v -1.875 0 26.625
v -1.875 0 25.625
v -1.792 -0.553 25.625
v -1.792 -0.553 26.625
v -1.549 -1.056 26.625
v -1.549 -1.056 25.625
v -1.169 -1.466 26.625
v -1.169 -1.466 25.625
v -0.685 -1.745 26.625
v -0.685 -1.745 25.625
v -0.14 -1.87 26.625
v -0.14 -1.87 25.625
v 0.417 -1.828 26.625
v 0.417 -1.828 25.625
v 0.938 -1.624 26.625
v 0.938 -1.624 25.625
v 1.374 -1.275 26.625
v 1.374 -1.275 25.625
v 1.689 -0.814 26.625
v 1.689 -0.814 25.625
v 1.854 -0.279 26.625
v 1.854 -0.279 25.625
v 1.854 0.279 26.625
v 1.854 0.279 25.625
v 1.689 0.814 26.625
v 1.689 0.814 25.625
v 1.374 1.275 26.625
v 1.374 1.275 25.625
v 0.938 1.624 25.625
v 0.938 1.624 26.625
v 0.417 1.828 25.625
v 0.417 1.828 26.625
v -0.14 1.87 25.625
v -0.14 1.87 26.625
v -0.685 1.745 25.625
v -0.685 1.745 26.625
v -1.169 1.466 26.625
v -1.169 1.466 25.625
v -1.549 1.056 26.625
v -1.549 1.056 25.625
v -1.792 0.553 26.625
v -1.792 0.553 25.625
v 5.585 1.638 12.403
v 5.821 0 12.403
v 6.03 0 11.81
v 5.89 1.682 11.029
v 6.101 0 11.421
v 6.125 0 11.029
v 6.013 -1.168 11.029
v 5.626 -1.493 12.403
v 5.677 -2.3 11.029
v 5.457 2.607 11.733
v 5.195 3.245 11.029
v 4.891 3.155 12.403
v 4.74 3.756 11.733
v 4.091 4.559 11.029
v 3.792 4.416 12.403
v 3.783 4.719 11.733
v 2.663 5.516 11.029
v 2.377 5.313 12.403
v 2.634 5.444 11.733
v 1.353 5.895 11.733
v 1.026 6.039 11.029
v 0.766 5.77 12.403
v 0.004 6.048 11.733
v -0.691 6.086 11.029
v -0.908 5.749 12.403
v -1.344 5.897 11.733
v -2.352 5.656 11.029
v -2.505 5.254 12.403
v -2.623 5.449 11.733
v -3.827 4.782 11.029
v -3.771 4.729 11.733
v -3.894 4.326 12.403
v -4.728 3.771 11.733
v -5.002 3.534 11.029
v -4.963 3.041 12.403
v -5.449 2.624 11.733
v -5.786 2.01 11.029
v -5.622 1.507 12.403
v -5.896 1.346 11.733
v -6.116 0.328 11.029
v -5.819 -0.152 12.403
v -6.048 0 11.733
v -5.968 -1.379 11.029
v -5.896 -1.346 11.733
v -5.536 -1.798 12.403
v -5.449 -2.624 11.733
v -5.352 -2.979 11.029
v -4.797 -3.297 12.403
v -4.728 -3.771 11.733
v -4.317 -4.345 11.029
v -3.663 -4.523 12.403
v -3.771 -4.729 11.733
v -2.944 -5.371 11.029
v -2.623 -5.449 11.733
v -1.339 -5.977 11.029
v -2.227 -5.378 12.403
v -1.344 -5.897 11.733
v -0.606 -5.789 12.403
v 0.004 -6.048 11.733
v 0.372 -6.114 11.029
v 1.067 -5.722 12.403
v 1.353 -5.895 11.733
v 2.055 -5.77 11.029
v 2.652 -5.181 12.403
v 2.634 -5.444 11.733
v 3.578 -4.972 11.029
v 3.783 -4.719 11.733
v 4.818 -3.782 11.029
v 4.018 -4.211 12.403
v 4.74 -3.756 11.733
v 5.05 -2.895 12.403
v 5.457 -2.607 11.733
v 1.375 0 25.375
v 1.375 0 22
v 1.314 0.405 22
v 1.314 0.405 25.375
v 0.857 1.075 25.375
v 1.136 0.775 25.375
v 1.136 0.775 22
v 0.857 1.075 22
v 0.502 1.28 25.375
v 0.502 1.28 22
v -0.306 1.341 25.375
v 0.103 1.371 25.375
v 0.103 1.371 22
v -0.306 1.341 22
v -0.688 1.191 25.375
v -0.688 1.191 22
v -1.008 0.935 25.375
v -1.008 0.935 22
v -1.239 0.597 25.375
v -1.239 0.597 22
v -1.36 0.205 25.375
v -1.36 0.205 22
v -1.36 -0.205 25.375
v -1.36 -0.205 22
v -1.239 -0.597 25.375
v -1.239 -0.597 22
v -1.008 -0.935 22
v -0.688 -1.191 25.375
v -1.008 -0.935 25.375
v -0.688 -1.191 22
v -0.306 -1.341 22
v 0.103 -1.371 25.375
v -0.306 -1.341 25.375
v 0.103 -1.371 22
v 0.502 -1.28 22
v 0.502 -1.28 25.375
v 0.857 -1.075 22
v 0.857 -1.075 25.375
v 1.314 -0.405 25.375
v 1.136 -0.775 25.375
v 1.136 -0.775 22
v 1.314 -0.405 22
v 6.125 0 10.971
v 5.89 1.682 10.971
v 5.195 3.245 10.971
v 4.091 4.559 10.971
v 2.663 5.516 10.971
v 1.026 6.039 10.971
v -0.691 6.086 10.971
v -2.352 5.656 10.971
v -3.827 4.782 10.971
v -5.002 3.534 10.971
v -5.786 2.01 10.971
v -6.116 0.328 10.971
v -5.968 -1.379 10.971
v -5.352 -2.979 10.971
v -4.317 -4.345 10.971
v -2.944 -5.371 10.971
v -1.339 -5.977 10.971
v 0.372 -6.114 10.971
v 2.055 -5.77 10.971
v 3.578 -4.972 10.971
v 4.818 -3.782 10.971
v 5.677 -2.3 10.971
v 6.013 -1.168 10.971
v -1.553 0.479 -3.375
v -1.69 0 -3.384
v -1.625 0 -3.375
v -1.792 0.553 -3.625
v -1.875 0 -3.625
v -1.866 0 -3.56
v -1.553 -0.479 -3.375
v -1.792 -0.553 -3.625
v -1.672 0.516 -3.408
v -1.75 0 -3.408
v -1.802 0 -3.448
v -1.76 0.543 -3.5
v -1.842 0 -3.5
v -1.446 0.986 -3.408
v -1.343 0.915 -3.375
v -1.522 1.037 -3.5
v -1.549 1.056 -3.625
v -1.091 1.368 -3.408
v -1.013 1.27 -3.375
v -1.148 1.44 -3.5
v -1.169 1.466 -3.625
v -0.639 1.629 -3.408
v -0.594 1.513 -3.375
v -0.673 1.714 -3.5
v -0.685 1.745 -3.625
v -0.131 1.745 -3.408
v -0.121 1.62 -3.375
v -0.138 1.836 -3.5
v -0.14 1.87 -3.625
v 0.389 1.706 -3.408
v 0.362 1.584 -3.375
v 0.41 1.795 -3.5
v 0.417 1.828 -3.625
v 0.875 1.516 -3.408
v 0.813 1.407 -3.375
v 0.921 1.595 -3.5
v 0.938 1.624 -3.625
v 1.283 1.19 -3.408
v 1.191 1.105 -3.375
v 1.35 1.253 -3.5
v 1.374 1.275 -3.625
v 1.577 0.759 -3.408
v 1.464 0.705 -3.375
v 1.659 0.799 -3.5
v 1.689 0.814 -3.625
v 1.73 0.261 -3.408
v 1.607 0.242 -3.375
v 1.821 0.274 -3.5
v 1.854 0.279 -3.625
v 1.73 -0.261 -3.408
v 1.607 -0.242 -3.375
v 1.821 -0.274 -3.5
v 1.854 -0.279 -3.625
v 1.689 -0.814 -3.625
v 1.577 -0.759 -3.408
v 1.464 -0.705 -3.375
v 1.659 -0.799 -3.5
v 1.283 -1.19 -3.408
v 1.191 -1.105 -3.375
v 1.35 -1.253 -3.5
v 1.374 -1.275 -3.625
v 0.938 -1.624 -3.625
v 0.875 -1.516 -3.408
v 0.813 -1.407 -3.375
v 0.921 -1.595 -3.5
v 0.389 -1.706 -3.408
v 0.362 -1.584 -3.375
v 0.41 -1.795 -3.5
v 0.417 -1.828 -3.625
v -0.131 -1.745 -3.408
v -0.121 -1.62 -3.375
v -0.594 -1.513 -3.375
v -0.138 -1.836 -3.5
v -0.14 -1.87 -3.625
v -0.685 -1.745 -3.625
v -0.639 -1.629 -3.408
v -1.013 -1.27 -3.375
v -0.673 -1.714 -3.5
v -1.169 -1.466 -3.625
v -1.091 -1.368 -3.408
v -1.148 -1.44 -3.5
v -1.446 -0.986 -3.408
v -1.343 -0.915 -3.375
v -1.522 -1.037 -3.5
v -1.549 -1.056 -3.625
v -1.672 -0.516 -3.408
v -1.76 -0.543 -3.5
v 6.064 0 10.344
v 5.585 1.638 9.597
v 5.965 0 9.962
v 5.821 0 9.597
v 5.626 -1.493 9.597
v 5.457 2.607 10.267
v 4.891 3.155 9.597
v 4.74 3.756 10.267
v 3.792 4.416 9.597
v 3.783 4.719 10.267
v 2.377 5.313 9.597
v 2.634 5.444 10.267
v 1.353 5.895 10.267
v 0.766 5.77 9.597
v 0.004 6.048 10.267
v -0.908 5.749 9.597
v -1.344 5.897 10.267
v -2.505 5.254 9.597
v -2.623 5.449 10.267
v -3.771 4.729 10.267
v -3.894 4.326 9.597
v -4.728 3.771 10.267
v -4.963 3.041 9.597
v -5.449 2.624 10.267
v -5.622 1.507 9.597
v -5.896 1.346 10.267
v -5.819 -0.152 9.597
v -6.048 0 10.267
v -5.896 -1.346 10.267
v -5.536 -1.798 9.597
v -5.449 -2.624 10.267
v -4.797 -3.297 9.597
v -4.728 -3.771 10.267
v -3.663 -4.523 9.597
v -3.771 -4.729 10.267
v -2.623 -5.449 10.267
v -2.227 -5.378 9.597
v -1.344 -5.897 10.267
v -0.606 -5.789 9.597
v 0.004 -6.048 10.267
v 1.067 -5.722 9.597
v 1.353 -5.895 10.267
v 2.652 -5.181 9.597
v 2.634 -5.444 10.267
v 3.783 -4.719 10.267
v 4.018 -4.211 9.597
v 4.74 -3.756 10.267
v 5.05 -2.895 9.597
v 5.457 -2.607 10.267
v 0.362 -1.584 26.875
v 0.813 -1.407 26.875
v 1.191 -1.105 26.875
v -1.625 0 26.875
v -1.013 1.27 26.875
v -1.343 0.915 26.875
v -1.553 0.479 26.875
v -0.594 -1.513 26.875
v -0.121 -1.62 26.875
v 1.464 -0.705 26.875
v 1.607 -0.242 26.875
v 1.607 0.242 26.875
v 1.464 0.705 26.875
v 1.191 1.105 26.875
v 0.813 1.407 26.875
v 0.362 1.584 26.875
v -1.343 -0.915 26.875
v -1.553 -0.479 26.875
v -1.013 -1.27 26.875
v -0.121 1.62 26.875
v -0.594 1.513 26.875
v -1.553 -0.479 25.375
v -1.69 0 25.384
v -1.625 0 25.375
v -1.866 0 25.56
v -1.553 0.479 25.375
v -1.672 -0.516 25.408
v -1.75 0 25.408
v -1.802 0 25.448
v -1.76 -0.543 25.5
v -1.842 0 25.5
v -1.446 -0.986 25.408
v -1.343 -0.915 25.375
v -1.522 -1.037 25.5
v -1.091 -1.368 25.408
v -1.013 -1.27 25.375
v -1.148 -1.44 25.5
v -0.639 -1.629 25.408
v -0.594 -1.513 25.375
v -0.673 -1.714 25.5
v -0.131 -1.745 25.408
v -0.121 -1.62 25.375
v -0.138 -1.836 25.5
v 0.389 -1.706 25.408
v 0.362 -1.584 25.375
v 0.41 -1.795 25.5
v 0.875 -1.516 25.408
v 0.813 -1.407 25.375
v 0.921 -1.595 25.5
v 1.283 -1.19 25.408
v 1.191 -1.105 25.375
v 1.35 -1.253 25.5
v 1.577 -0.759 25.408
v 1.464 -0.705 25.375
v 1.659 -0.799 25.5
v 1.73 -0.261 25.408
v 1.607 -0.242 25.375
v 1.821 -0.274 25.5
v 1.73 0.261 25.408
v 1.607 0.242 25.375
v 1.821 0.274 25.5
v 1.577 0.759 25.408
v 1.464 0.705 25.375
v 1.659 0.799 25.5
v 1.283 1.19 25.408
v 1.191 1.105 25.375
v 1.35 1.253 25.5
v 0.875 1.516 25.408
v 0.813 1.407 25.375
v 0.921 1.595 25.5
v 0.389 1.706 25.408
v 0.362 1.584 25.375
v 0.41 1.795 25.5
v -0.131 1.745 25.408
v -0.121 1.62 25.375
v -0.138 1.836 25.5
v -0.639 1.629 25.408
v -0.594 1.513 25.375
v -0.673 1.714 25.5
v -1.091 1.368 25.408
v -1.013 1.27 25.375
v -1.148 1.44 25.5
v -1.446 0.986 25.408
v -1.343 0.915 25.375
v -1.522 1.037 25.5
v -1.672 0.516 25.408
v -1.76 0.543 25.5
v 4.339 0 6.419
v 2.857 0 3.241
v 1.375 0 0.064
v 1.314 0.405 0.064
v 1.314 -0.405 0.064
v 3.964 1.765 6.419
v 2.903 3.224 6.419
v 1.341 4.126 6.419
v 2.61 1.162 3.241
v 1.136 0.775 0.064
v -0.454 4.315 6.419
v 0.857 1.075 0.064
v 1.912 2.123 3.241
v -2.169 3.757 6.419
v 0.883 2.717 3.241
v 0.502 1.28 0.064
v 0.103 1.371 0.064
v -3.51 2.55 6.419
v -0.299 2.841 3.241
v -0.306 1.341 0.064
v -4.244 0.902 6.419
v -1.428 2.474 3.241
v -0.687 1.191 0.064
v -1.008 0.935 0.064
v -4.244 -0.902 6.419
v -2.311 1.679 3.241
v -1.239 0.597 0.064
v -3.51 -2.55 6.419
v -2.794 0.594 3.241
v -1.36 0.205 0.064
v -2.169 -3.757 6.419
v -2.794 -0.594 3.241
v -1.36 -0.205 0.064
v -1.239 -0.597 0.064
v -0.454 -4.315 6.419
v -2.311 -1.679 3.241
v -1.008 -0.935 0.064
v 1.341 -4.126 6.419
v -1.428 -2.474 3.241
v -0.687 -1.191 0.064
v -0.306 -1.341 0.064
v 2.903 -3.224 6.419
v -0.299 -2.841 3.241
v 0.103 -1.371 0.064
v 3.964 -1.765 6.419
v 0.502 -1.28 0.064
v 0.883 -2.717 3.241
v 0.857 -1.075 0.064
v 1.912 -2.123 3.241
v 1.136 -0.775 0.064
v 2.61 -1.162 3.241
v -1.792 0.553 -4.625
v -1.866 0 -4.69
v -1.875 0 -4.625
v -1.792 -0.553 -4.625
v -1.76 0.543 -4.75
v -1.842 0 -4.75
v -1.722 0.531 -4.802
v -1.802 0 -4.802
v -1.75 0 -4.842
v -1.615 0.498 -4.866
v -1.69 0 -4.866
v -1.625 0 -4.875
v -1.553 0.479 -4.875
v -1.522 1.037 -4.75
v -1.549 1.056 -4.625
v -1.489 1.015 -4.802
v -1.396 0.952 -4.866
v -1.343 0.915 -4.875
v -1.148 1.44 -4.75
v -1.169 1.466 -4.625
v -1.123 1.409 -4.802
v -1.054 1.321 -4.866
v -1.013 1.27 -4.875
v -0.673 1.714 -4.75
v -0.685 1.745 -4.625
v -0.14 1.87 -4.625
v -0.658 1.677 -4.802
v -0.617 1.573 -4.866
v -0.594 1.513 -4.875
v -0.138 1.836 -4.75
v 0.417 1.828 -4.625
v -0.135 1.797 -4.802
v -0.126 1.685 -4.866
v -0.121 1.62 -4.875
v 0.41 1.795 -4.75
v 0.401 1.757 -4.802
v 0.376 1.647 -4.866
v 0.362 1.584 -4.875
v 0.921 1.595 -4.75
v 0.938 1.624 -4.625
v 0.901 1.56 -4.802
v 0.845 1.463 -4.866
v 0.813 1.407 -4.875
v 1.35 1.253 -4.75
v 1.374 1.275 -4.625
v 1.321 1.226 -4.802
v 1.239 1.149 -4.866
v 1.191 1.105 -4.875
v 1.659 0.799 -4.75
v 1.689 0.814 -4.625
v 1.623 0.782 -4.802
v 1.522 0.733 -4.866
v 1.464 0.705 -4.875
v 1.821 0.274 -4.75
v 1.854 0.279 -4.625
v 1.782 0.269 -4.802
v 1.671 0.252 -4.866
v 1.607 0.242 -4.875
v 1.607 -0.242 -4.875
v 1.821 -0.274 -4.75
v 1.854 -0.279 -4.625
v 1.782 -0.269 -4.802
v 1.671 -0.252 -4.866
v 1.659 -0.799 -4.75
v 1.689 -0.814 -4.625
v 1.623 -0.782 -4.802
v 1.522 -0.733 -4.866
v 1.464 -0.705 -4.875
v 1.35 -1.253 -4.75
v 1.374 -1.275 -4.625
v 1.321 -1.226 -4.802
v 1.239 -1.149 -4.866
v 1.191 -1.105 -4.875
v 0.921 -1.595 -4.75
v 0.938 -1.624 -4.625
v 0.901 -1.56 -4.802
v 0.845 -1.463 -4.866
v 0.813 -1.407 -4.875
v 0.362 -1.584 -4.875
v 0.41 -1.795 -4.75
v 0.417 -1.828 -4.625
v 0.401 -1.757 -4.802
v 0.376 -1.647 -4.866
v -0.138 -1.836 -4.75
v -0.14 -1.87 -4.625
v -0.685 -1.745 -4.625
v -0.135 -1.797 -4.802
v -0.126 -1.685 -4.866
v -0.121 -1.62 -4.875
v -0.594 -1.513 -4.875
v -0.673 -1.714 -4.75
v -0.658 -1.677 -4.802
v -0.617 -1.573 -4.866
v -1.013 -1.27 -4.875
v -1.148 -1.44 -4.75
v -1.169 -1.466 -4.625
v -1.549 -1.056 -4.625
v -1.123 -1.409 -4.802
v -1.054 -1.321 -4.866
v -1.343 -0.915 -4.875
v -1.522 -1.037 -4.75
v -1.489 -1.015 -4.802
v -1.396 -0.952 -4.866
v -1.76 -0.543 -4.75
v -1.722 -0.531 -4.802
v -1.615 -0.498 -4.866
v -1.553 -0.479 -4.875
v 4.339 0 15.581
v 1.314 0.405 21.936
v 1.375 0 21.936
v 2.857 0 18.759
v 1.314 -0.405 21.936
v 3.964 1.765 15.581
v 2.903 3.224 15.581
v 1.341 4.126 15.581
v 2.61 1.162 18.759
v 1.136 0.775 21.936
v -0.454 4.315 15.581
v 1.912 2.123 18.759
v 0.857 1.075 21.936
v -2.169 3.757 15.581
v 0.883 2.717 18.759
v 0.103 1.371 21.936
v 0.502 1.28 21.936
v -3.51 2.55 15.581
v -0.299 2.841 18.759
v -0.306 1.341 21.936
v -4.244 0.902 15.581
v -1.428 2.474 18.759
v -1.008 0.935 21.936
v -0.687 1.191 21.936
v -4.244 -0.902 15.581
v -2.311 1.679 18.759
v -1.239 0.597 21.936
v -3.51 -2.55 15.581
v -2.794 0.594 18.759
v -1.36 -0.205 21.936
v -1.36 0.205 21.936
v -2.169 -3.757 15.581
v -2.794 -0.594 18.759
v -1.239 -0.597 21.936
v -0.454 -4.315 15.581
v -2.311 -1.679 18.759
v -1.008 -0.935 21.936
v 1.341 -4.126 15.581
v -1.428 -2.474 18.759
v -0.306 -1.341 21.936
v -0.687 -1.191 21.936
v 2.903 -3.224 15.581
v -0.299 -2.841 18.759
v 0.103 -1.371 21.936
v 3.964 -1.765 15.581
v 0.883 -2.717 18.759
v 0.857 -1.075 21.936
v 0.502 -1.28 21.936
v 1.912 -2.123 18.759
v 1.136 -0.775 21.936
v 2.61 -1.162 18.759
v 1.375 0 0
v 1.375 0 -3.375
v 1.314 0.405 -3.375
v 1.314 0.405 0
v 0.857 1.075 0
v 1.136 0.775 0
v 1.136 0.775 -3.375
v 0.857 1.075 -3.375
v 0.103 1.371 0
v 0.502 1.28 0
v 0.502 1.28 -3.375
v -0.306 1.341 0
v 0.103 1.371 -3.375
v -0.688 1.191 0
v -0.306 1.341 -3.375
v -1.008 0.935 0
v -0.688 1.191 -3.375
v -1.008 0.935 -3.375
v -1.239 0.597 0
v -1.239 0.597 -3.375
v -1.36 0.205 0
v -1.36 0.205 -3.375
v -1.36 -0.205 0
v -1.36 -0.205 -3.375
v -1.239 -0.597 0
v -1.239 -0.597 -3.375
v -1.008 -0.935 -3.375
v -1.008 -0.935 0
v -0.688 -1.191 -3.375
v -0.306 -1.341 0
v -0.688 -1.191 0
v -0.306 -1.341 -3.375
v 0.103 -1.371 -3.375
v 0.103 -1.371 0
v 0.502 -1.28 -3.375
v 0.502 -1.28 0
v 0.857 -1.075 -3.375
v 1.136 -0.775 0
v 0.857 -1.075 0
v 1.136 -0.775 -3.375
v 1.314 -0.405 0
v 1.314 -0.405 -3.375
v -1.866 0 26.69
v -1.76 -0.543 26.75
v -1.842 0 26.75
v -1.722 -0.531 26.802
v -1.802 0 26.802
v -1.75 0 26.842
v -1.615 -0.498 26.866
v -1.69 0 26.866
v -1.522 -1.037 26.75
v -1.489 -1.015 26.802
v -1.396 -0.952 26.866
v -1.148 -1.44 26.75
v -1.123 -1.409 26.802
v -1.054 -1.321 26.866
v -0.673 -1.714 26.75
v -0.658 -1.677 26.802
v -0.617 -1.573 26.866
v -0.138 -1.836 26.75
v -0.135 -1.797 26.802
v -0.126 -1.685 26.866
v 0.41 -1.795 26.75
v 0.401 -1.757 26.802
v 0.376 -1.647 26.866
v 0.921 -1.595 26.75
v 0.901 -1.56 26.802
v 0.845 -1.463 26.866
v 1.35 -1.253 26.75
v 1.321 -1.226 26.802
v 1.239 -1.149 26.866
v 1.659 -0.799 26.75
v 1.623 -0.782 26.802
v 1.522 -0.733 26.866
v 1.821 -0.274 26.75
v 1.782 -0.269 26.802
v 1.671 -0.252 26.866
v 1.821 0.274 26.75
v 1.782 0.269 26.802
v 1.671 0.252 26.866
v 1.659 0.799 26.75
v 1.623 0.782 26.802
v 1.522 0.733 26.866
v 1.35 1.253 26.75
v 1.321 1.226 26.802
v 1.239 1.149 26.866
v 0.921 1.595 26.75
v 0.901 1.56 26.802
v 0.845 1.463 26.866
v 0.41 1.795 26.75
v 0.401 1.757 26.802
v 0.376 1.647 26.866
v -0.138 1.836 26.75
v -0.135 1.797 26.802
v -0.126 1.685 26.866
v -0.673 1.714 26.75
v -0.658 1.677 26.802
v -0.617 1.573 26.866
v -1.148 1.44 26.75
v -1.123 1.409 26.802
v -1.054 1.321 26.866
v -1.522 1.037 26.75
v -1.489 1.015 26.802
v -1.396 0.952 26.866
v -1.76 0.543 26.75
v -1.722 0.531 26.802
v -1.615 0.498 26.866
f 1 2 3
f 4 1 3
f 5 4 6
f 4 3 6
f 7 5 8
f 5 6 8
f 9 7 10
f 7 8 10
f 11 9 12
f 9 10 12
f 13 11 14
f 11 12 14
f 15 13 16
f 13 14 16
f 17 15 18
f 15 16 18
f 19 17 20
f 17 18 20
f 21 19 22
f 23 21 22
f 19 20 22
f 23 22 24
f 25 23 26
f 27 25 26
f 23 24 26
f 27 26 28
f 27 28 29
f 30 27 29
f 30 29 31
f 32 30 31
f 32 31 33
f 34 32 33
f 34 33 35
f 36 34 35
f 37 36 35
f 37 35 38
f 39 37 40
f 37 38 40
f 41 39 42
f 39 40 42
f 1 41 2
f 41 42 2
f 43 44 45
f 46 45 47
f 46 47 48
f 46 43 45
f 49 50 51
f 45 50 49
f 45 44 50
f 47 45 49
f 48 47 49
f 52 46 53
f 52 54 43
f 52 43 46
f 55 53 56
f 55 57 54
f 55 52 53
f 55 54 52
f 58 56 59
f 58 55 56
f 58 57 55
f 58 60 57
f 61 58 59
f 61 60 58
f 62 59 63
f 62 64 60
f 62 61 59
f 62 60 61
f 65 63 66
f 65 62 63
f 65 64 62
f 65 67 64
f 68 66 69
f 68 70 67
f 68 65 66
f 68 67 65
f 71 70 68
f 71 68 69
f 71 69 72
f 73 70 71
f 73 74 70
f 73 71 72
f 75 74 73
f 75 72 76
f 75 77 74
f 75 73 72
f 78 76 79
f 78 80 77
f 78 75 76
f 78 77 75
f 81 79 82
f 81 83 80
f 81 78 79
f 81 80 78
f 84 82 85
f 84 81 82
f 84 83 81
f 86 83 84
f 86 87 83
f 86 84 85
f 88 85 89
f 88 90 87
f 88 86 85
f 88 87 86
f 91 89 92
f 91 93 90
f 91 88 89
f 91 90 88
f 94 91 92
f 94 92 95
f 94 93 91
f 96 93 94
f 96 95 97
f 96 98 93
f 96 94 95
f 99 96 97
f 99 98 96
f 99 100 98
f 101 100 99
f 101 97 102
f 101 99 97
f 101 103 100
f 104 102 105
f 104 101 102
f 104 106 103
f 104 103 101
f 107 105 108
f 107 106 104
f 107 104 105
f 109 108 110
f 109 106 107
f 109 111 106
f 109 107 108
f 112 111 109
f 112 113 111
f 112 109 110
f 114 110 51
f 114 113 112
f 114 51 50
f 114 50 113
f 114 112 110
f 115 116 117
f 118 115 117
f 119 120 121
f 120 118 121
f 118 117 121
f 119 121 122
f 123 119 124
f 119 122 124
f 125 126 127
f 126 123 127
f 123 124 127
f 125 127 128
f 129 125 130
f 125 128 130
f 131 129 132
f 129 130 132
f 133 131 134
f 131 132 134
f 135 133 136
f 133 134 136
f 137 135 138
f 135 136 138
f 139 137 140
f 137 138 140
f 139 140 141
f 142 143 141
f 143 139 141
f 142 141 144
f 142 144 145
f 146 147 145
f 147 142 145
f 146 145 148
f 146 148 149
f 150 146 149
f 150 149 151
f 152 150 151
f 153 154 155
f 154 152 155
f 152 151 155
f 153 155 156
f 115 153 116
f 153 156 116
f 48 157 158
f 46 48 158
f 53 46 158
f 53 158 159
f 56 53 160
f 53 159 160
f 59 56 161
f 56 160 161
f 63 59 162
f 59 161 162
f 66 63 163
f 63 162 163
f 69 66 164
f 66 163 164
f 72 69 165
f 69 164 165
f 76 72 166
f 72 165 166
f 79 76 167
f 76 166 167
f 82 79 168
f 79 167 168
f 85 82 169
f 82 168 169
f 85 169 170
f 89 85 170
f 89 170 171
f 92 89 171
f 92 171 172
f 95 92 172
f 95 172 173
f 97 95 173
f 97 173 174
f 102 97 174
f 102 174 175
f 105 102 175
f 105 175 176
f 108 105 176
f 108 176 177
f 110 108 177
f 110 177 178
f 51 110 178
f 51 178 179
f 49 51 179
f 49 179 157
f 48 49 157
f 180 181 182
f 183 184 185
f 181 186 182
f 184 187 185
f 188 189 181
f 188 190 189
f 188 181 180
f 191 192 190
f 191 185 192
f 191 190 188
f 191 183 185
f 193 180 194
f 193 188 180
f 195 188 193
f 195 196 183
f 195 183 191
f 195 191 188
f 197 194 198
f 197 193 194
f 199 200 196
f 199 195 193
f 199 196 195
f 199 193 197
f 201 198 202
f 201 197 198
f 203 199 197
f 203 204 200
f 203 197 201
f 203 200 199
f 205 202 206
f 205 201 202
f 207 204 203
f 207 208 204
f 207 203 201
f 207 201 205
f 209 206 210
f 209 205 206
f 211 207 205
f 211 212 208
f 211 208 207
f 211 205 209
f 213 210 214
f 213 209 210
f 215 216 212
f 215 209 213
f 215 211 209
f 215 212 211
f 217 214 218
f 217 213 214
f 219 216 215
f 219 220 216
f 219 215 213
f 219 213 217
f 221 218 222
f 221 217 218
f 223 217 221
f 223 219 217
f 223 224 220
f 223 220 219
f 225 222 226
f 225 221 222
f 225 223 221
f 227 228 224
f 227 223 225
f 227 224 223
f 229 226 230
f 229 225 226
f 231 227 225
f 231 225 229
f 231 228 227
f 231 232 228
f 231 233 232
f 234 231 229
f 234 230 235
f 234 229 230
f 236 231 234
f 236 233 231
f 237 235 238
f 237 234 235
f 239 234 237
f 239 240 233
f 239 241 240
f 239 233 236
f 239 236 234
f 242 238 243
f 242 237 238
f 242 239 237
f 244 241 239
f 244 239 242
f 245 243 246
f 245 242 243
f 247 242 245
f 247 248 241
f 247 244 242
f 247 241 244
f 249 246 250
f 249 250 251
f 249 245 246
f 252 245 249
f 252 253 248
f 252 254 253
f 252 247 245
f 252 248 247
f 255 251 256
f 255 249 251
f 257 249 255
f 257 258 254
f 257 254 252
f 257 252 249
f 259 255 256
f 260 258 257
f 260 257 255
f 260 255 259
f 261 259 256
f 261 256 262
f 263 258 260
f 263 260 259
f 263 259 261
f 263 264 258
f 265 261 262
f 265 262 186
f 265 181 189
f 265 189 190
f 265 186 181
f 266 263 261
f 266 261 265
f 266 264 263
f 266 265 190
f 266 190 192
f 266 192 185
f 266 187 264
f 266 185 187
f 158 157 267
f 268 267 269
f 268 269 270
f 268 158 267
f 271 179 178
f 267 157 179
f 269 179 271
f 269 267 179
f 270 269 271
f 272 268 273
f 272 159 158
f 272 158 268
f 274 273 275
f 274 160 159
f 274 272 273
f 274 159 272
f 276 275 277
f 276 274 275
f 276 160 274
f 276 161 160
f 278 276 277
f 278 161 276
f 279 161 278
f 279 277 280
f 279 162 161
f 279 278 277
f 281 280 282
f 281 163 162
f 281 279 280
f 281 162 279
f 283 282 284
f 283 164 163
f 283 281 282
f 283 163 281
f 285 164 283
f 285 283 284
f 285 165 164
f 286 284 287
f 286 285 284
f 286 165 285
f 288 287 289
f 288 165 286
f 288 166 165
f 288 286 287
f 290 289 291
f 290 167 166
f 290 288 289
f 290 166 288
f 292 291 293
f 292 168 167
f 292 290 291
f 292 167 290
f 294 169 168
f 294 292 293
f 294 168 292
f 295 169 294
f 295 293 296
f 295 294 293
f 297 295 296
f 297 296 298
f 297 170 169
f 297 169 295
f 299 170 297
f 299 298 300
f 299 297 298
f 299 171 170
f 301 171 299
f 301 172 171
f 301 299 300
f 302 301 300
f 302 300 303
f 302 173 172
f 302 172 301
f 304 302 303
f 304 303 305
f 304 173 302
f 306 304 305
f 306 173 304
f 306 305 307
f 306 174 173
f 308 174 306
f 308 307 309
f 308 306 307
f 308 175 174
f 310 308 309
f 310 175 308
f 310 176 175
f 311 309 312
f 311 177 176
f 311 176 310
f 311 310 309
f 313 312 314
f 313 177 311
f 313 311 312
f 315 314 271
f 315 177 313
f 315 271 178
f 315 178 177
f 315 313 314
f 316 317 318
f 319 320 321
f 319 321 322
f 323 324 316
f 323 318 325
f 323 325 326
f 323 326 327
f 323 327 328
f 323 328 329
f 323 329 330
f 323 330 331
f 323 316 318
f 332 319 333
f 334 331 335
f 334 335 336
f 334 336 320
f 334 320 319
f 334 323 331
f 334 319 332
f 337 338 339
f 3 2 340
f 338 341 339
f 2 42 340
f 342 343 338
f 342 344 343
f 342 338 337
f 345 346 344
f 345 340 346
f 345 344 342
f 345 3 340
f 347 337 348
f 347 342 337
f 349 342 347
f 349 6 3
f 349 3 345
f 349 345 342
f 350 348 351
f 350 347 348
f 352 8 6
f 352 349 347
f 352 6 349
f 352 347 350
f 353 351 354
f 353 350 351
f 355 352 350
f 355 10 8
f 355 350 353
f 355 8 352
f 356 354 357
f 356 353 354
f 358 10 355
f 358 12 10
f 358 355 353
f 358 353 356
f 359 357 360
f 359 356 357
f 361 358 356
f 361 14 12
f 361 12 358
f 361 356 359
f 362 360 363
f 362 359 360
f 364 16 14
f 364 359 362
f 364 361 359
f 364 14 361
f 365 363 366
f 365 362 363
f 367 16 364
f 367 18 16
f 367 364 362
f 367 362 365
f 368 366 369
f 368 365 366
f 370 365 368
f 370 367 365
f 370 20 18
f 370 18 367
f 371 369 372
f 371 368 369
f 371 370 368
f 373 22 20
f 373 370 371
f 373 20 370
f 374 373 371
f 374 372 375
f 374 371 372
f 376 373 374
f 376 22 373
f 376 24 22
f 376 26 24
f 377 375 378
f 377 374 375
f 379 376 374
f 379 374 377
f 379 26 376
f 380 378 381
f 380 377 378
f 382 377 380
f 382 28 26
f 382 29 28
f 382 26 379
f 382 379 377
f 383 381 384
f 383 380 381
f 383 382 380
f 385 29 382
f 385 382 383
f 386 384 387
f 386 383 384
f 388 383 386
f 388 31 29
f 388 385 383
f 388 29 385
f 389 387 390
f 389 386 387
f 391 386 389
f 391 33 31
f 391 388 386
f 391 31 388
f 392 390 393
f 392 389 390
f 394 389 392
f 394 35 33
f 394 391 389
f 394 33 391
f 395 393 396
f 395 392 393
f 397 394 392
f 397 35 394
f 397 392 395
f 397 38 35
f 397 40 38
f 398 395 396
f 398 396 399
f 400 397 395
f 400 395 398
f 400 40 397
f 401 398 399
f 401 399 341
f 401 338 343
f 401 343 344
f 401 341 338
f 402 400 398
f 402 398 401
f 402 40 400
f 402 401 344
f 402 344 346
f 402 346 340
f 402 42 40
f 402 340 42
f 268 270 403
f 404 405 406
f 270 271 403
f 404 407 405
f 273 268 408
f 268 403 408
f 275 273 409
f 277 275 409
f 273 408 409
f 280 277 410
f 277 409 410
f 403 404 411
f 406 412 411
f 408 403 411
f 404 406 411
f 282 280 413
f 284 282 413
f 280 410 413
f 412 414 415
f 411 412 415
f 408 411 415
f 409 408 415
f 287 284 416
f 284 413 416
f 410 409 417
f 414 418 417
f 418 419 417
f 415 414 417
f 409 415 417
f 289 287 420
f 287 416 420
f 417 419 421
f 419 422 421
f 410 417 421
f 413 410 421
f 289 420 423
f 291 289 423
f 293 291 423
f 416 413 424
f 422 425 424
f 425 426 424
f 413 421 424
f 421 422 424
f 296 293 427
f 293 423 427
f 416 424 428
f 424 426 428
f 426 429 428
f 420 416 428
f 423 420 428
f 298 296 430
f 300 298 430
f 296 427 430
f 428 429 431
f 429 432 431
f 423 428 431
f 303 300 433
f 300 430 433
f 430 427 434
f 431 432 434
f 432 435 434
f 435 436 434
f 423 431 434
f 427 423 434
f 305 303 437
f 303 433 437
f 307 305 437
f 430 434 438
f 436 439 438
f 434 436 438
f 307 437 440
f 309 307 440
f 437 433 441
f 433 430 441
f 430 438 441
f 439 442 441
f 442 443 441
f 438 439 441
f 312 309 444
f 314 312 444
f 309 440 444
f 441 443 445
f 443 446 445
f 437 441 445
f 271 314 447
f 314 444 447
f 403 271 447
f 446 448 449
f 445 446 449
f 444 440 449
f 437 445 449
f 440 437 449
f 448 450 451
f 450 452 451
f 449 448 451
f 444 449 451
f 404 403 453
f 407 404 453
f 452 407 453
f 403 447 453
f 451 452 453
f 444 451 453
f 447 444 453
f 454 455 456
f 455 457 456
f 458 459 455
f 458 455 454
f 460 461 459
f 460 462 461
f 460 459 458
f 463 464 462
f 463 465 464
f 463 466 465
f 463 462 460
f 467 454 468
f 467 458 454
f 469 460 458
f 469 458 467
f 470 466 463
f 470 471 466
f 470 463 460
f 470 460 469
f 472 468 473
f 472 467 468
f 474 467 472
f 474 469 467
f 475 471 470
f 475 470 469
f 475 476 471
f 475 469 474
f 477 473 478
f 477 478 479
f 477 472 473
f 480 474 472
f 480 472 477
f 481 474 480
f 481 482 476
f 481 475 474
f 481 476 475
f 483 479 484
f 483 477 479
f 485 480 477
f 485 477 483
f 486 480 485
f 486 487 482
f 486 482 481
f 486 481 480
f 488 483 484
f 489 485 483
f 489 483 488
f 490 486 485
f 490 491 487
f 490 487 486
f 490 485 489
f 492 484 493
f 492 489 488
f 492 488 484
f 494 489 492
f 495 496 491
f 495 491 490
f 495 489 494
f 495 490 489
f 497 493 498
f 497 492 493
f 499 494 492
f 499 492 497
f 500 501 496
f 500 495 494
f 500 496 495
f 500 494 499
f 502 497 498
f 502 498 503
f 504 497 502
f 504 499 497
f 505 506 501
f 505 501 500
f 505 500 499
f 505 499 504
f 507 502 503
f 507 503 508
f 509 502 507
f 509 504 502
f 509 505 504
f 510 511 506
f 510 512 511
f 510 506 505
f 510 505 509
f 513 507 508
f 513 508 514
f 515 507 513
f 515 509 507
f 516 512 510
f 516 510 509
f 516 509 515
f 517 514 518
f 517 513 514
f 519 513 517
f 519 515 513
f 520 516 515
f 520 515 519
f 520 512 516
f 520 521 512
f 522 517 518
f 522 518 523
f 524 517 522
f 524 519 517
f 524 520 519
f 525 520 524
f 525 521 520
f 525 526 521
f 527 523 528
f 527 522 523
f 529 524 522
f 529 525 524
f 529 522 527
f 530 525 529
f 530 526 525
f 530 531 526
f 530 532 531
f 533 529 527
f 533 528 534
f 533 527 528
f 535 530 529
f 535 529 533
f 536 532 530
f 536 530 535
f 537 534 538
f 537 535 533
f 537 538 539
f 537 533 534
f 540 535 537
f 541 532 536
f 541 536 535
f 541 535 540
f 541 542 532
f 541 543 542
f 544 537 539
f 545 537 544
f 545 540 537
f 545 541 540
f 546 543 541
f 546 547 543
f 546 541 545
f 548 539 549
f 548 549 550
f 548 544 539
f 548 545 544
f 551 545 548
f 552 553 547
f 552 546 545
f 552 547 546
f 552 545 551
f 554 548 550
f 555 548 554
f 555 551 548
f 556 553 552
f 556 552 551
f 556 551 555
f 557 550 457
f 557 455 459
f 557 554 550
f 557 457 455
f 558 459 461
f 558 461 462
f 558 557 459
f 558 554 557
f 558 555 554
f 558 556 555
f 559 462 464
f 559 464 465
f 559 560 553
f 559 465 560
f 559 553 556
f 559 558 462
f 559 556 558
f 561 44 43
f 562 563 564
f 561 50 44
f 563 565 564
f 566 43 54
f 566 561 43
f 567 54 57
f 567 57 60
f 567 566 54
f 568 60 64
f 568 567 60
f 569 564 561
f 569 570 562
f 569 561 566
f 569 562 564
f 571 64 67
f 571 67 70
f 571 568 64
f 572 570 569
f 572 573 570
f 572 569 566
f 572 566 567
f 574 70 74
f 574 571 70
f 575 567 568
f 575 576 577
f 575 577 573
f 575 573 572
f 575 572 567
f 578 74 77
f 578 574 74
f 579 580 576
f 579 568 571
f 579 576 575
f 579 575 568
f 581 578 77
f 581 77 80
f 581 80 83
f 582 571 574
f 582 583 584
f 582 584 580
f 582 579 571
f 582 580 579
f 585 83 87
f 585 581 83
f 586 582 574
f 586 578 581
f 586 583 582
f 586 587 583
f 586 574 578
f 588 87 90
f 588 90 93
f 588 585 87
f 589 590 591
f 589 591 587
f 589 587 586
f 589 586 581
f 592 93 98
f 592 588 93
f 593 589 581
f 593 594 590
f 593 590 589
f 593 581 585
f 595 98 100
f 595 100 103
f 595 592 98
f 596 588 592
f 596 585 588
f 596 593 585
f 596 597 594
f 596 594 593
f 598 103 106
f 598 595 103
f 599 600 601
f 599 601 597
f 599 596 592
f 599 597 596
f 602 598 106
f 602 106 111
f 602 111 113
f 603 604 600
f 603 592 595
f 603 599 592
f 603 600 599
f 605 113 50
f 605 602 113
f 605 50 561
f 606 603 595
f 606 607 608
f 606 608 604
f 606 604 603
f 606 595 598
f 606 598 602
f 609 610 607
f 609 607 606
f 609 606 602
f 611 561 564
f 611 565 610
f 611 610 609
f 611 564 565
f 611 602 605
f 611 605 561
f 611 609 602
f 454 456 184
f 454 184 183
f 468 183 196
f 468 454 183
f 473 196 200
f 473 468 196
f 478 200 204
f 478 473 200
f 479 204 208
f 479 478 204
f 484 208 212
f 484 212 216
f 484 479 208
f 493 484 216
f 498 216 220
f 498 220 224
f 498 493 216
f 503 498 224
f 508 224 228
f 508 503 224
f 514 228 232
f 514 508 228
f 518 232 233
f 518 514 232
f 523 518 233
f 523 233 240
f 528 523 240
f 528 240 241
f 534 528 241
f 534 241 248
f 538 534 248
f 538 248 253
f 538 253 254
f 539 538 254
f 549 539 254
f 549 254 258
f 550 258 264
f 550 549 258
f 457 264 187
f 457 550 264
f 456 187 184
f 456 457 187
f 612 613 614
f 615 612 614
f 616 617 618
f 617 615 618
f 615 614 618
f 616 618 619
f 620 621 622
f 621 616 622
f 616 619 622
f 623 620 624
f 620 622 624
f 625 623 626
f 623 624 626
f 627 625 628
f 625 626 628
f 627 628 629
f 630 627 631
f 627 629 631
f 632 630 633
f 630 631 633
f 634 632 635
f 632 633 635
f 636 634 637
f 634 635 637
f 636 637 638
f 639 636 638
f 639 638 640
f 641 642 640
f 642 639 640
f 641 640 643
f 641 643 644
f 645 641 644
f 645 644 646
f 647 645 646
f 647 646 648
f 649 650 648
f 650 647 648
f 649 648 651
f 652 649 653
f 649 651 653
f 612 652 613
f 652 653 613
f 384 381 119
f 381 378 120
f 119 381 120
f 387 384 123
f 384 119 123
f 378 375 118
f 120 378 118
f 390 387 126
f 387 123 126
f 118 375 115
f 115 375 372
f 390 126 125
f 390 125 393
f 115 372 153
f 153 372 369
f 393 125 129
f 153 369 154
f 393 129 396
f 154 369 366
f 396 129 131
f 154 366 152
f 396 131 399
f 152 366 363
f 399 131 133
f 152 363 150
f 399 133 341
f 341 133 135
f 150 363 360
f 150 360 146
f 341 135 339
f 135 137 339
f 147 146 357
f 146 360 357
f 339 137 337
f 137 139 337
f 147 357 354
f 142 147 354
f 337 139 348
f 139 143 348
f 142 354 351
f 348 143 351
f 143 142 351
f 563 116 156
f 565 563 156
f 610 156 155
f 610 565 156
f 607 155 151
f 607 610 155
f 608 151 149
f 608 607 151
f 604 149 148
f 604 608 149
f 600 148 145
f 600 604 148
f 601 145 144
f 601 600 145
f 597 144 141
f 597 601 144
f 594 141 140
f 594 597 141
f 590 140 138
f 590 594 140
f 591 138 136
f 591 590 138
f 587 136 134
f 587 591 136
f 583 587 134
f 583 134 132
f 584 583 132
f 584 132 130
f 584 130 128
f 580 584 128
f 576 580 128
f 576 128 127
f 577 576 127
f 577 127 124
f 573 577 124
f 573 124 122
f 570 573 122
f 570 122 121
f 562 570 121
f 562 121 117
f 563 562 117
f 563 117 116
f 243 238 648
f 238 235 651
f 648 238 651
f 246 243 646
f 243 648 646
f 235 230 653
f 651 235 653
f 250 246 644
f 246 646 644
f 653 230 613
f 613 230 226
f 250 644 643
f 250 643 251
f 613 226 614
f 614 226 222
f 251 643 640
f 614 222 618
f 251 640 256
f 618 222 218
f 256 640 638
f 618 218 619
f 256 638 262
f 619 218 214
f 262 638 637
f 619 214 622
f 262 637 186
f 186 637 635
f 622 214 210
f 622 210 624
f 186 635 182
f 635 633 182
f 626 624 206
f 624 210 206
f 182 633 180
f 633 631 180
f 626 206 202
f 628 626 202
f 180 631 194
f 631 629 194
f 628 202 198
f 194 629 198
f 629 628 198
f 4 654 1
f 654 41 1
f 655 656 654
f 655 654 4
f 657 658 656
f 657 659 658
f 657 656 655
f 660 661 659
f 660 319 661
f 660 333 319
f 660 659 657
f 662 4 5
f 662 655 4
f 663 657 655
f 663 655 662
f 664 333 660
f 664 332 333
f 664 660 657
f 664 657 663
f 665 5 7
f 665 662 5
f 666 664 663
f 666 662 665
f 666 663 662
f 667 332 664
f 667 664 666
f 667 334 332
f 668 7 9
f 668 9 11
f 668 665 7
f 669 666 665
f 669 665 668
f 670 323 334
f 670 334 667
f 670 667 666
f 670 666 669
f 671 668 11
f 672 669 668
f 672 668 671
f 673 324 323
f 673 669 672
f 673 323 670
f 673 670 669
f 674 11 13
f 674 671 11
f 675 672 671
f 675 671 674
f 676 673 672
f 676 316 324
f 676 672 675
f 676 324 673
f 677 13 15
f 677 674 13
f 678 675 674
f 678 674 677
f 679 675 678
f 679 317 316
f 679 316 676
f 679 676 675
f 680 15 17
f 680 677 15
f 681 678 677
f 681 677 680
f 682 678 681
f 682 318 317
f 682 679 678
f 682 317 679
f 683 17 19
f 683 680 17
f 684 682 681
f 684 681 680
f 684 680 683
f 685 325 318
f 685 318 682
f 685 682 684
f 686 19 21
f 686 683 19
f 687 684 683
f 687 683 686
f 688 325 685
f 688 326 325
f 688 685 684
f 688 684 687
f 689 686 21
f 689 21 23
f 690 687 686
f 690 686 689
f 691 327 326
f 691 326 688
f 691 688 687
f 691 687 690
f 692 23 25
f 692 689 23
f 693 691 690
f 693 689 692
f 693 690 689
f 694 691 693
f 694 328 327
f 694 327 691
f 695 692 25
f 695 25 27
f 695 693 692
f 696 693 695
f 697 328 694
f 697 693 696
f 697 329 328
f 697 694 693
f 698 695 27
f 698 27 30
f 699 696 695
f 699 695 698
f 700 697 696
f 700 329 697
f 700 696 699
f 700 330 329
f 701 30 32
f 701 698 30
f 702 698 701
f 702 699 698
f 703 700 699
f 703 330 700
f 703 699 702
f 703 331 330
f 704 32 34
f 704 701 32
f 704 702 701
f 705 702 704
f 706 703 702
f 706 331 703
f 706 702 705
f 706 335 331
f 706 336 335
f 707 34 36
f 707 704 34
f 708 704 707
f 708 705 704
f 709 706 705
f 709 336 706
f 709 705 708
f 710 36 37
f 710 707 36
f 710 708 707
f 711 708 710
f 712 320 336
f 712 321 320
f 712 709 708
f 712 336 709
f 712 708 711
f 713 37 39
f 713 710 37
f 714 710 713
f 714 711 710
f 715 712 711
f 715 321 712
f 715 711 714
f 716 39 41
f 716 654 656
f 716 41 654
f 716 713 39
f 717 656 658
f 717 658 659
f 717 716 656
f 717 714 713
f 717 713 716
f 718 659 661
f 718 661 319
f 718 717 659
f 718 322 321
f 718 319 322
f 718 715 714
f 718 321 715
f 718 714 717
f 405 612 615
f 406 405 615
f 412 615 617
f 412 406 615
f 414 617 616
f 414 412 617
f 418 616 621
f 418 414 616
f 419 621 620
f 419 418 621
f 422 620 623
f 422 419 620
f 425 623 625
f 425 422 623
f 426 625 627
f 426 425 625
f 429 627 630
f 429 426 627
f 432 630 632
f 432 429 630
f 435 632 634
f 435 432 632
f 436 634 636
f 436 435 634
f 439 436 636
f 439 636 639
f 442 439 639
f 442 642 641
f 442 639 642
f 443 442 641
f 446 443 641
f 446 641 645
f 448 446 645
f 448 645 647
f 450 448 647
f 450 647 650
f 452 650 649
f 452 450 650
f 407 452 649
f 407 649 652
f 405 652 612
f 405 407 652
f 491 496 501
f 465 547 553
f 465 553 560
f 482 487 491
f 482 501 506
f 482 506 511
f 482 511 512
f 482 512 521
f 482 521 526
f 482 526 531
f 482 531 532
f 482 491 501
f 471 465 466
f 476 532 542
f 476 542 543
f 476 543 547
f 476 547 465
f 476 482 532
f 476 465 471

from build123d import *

# Parameters (mm, degrees)
ESQUISSE1_R             = 6.125
BOSS_EXTRU_1_DEPTH      = 22
BOSS_EXTRU_2_DEPTH      = 15.875
BOSS_EXTRU_2_DEPTH_BACK = 15.875
BOSS_EXTRU_2_START      = -11
ESQUISSE2_R             = 1.375
ESQUISSE3_R             = 1.875
BOSS_EXTRU_3_DEPTH      = 1.5
BOSS_EXTRU_4_START      = -1.5
ESQUISSE4_R             = 1.875
BOSS_EXTRU_4_DEPTH      = 1.5
CHANFREIN1_SIZE         = 10.25
CHANFREIN1_SIZE_2       = 4.779653496
CONG_1_R                = 3.25
CONG_2_R                = 0.25


with BuildPart() as part:
    # Esquisse1 → Boss.-Extru.1 (new body)
    with BuildSketch(Plane.XY):
        Circle(ESQUISSE1_R)
    extrude(amount=BOSS_EXTRU_1_DEPTH)

    # Esquisse2 → Boss.-Extru.2 (add, two sides: drawn at the far end of the back side and taken through both)
    with BuildSketch(Plane.XY.offset(22).offset(BOSS_EXTRU_2_START - BOSS_EXTRU_2_DEPTH_BACK)):
        Circle(ESQUISSE2_R)
    extrude(amount=BOSS_EXTRU_2_DEPTH + BOSS_EXTRU_2_DEPTH_BACK)

    # Esquisse3 → Boss.-Extru.3 (add)
    with BuildSketch(Plane(origin=(0, 0, -4.875), x_dir=(-1, 0, 0), z_dir=(0, 0, -1))):
        Circle(ESQUISSE3_R)
    extrude(amount=-BOSS_EXTRU_3_DEPTH)

    # Esquisse4 → Boss.-Extru.4 (add)
    with BuildSketch(Plane.XY.offset(26.875).offset(BOSS_EXTRU_4_START)):
        with Locations(Location((0, 0, 0), (0, 0, 180))):
            Circle(ESQUISSE4_R)
    extrude(amount=BOSS_EXTRU_4_DEPTH)

    # Chanfrein1
    # the kernel refuses this chamfer: 10.25, 4.779653496 mm, written as the material it takes off along each edge
    with BuildSketch(Plane(origin=(0, 0, 22), x_dir=(1, 0, 0), z_dir=(0, -1, 0))) as chanfrein1_piece_1_section:
        Polygon((6.125, -CHANFREIN1_SIZE), (6.125 - CHANFREIN1_SIZE_2, 0), (6.125, 0), align=None)
    chanfrein1_piece_1 = revolve(axis=Axis((0, 0, 22), (0, 0, 1)), mode=Mode.PRIVATE)
    chanfrein1_piece_1 = chanfrein1_piece_1 - Plane(origin=(0, 0, 16.69695502), x_dir=(1, 0, 0), z_dir=(0, 0, -1)) * Cylinder(1.375, 41, mode=Mode.PRIVATE)
    add(chanfrein1_piece_1, mode=Mode.SUBTRACT)
    with BuildSketch(Plane(origin=(0, 0, 0), x_dir=(1, 0, 0), z_dir=(0, -1, 0))) as chanfrein1_piece_2_section:
        Polygon((6.125, CHANFREIN1_SIZE), (6.125 - CHANFREIN1_SIZE_2, 0), (6.125, 0), align=None)
    chanfrein1_piece_2 = revolve(axis=Axis((0, 0, 0), (0, 0, 1)), mode=Mode.PRIVATE)
    chanfrein1_piece_2 = chanfrein1_piece_2 - Plane(origin=(0, 0, 5.30304498), x_dir=(1, 0, 0), z_dir=(0, 0, 1)) * Cylinder(1.375, 41, mode=Mode.PRIVATE)
    add(chanfrein1_piece_2, mode=Mode.SUBTRACT)

    # Congé1
    cong_1_edges = [part.edges().sort_by_distance(p)[0] for p in [
        (-6.125, 0, 11.75),
        (-6.125, 0, 10.25),
    ]]
    fillet(cong_1_edges, radius=CONG_1_R)

    # Congé2
    cong_2_edges = [part.edges().sort_by_distance(p)[0] for p in [
        (1.875, 0, -3.375),
        (1.875, 0, -4.875),
        (1.875, 0, 25.375),
        (1.875, 0, 26.875),
    ]]
    fillet(cong_2_edges, radius=CONG_2_R)


solid = part.part
